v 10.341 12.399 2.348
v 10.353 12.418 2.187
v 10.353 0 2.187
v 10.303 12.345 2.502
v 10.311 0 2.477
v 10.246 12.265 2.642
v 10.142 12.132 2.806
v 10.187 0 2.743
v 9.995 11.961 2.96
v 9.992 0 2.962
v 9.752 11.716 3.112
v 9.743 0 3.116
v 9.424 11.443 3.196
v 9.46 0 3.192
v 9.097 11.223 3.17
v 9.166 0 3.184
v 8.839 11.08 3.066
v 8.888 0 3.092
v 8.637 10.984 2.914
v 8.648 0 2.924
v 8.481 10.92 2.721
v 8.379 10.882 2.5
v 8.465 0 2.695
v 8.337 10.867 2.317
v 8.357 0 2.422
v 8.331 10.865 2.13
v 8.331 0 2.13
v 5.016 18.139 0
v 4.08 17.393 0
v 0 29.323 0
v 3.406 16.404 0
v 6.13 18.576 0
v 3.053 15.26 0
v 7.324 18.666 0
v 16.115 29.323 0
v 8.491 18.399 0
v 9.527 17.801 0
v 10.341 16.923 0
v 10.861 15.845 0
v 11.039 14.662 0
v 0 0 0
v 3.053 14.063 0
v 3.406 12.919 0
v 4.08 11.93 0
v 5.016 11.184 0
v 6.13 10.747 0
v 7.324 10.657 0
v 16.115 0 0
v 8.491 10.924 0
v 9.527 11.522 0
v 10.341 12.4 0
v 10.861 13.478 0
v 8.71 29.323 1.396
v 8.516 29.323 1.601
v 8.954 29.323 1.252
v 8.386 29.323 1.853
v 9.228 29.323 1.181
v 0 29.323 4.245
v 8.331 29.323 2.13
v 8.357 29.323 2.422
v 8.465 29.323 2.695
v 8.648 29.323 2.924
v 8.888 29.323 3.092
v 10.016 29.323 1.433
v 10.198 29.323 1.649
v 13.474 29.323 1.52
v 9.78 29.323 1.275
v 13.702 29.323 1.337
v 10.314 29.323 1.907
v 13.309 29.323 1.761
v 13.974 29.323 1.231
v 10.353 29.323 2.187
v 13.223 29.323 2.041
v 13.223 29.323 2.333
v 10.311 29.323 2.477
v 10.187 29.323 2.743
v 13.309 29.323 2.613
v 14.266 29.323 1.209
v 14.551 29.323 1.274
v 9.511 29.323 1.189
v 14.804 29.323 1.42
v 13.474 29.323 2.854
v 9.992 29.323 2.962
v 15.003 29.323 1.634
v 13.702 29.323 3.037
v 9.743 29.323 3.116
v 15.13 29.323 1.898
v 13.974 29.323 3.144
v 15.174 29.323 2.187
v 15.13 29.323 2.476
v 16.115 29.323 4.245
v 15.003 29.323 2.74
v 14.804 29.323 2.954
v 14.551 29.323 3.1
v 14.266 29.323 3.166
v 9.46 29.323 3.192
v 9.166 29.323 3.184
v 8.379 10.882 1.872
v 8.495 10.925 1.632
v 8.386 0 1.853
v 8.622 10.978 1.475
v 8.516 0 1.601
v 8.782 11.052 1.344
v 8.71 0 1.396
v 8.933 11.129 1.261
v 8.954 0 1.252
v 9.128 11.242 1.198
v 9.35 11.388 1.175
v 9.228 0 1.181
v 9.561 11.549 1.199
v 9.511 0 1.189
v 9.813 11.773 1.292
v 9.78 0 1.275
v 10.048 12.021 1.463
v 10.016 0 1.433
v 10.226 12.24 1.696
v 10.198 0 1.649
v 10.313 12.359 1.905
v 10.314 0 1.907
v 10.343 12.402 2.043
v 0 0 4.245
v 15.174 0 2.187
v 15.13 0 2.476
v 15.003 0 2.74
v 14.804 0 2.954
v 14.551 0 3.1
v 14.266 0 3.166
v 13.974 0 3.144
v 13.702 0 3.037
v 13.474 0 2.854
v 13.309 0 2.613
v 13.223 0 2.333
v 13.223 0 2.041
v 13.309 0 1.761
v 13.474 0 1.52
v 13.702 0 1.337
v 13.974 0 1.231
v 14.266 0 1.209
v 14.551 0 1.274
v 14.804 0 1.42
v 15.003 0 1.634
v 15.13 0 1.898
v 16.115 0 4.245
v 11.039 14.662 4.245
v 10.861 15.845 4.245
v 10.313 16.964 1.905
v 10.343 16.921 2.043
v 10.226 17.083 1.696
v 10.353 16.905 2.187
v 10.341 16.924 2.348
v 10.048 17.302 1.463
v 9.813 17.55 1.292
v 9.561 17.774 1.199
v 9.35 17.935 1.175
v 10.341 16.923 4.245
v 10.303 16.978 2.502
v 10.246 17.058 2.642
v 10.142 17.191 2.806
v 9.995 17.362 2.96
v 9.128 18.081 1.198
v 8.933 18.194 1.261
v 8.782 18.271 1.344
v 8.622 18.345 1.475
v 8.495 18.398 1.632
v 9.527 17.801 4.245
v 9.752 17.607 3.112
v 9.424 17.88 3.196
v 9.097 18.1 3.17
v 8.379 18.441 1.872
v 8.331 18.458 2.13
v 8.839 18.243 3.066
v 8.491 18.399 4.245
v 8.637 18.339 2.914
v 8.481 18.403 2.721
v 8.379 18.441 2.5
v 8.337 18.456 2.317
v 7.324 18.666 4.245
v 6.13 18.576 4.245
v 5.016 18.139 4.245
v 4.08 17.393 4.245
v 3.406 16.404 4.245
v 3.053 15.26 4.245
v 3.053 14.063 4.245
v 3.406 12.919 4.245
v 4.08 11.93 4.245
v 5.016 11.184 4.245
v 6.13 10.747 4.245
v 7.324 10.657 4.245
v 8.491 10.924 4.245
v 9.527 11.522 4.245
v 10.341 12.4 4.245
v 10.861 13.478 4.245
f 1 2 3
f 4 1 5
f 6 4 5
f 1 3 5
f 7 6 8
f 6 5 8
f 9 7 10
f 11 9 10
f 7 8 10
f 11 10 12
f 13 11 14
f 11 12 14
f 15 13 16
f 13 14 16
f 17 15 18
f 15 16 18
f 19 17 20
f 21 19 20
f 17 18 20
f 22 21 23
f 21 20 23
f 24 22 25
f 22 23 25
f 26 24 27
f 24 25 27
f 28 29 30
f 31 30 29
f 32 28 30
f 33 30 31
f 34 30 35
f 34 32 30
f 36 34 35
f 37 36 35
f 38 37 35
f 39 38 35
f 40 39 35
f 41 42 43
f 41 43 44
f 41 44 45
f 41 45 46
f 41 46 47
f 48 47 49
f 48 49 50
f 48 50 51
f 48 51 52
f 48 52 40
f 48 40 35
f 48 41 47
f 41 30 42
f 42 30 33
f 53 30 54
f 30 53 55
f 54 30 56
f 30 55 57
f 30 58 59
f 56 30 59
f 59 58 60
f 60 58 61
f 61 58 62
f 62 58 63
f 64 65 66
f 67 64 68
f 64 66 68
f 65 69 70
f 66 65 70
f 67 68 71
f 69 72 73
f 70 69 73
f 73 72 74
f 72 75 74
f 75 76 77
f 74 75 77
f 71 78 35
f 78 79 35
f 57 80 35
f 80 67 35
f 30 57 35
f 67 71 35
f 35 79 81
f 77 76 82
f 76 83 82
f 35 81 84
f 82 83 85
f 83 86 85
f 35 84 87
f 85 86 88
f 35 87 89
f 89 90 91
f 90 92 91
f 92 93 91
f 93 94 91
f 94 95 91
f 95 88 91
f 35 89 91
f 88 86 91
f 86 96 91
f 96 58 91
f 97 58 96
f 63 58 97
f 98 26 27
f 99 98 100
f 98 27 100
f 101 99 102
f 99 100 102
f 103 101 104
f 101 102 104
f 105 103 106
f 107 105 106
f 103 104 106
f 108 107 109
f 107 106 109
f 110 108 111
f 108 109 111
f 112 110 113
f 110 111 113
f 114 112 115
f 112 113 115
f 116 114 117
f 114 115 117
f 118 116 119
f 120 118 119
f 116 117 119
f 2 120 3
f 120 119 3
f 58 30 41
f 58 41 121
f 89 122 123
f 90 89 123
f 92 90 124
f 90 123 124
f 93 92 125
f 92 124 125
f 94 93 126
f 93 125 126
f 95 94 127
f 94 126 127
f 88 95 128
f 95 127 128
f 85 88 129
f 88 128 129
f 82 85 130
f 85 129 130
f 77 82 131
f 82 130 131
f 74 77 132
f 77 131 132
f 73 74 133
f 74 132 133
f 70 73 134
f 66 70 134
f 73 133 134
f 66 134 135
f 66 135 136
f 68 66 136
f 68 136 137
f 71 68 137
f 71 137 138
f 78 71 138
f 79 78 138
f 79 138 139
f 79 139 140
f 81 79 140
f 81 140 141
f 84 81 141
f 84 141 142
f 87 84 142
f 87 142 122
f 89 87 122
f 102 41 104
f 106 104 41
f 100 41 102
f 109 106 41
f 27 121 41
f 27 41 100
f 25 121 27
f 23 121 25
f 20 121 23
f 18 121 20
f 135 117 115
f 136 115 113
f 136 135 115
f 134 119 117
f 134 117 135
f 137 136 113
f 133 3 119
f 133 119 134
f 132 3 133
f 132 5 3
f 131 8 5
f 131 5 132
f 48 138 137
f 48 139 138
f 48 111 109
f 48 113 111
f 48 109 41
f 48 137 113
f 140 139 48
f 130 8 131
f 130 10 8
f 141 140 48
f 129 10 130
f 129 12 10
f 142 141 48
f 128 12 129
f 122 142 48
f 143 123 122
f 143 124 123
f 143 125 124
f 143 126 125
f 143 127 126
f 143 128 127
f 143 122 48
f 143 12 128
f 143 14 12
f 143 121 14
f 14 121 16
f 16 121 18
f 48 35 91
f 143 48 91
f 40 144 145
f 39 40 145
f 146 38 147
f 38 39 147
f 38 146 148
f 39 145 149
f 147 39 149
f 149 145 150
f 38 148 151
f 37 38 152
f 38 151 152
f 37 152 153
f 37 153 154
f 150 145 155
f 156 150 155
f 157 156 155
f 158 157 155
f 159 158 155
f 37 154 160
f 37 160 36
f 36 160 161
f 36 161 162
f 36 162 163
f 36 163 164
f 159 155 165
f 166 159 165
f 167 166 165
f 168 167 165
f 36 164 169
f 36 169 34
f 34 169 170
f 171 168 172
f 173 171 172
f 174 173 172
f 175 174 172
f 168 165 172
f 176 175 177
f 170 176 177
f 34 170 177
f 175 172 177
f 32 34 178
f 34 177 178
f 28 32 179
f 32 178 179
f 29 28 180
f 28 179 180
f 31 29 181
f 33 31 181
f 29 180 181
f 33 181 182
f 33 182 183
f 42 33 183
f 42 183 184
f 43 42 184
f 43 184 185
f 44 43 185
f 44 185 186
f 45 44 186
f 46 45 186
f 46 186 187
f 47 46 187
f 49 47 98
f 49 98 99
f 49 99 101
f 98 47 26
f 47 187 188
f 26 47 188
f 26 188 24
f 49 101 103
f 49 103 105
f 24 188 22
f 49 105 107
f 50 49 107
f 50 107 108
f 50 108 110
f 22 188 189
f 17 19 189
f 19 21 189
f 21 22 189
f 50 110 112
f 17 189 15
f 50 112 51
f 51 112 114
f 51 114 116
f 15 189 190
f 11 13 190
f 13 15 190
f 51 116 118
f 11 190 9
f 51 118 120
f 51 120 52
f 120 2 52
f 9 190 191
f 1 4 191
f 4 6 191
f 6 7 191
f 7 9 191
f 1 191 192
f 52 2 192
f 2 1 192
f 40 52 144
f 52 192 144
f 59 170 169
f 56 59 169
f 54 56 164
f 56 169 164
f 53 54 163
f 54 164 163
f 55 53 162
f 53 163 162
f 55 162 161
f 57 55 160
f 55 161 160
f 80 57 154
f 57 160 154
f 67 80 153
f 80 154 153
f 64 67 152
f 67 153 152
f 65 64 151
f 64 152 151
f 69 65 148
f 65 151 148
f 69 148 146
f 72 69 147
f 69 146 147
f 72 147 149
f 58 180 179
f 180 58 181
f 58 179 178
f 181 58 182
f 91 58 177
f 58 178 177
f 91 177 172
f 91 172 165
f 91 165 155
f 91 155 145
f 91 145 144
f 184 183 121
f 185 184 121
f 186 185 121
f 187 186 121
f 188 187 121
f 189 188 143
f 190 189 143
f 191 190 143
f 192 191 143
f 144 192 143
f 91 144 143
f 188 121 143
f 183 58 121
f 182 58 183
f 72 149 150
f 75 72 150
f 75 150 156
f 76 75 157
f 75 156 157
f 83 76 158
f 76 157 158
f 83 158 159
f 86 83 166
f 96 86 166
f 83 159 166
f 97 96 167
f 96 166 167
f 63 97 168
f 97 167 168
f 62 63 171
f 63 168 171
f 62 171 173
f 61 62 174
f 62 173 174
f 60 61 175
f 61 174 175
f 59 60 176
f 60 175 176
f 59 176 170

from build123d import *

# Parameters (mm, degrees)
F0_W     = 16.115269
F0_H     = 4.244756
F2_DEPTH = 29.323
F1_R     = 0.981148
F3_DEPTH = 42.4
F4_R     = 4.015374
F5_DEPTH = 25


with BuildPart() as f2:
    # F0 (on Front) → F2 (new body)
    with BuildSketch(Plane.XZ):
        with Locations((8.057634, 2.122378)):
            Rectangle(F0_W, F0_H)
    extrude(amount=-F2_DEPTH)

    # F1 (on face) → F3 (cut)
    with BuildSketch(Plane.XZ):
        with Locations((14.192748, 2.187148)):
            Circle(F1_R)
        with BuildLine():
            ThreePointArc((8.330639, 2.130213), (9.369746, 1.175413), (10.353437, 2.187214))
            ThreePointArc((10.353437, 2.187214), (9.312723, 3.199015), (8.330639, 2.130213))
        make_face()
    extrude(amount=-F3_DEPTH, mode=Mode.SUBTRACT)

    # F4 (on face) → F5 (cut)
    with BuildSketch(Plane.XY.offset(4.244756)):
        with Locations((7.023575, 14.6615)):
            Circle(F4_R)
    extrude(amount=-F5_DEPTH, mode=Mode.SUBTRACT)


solid = f2.part
